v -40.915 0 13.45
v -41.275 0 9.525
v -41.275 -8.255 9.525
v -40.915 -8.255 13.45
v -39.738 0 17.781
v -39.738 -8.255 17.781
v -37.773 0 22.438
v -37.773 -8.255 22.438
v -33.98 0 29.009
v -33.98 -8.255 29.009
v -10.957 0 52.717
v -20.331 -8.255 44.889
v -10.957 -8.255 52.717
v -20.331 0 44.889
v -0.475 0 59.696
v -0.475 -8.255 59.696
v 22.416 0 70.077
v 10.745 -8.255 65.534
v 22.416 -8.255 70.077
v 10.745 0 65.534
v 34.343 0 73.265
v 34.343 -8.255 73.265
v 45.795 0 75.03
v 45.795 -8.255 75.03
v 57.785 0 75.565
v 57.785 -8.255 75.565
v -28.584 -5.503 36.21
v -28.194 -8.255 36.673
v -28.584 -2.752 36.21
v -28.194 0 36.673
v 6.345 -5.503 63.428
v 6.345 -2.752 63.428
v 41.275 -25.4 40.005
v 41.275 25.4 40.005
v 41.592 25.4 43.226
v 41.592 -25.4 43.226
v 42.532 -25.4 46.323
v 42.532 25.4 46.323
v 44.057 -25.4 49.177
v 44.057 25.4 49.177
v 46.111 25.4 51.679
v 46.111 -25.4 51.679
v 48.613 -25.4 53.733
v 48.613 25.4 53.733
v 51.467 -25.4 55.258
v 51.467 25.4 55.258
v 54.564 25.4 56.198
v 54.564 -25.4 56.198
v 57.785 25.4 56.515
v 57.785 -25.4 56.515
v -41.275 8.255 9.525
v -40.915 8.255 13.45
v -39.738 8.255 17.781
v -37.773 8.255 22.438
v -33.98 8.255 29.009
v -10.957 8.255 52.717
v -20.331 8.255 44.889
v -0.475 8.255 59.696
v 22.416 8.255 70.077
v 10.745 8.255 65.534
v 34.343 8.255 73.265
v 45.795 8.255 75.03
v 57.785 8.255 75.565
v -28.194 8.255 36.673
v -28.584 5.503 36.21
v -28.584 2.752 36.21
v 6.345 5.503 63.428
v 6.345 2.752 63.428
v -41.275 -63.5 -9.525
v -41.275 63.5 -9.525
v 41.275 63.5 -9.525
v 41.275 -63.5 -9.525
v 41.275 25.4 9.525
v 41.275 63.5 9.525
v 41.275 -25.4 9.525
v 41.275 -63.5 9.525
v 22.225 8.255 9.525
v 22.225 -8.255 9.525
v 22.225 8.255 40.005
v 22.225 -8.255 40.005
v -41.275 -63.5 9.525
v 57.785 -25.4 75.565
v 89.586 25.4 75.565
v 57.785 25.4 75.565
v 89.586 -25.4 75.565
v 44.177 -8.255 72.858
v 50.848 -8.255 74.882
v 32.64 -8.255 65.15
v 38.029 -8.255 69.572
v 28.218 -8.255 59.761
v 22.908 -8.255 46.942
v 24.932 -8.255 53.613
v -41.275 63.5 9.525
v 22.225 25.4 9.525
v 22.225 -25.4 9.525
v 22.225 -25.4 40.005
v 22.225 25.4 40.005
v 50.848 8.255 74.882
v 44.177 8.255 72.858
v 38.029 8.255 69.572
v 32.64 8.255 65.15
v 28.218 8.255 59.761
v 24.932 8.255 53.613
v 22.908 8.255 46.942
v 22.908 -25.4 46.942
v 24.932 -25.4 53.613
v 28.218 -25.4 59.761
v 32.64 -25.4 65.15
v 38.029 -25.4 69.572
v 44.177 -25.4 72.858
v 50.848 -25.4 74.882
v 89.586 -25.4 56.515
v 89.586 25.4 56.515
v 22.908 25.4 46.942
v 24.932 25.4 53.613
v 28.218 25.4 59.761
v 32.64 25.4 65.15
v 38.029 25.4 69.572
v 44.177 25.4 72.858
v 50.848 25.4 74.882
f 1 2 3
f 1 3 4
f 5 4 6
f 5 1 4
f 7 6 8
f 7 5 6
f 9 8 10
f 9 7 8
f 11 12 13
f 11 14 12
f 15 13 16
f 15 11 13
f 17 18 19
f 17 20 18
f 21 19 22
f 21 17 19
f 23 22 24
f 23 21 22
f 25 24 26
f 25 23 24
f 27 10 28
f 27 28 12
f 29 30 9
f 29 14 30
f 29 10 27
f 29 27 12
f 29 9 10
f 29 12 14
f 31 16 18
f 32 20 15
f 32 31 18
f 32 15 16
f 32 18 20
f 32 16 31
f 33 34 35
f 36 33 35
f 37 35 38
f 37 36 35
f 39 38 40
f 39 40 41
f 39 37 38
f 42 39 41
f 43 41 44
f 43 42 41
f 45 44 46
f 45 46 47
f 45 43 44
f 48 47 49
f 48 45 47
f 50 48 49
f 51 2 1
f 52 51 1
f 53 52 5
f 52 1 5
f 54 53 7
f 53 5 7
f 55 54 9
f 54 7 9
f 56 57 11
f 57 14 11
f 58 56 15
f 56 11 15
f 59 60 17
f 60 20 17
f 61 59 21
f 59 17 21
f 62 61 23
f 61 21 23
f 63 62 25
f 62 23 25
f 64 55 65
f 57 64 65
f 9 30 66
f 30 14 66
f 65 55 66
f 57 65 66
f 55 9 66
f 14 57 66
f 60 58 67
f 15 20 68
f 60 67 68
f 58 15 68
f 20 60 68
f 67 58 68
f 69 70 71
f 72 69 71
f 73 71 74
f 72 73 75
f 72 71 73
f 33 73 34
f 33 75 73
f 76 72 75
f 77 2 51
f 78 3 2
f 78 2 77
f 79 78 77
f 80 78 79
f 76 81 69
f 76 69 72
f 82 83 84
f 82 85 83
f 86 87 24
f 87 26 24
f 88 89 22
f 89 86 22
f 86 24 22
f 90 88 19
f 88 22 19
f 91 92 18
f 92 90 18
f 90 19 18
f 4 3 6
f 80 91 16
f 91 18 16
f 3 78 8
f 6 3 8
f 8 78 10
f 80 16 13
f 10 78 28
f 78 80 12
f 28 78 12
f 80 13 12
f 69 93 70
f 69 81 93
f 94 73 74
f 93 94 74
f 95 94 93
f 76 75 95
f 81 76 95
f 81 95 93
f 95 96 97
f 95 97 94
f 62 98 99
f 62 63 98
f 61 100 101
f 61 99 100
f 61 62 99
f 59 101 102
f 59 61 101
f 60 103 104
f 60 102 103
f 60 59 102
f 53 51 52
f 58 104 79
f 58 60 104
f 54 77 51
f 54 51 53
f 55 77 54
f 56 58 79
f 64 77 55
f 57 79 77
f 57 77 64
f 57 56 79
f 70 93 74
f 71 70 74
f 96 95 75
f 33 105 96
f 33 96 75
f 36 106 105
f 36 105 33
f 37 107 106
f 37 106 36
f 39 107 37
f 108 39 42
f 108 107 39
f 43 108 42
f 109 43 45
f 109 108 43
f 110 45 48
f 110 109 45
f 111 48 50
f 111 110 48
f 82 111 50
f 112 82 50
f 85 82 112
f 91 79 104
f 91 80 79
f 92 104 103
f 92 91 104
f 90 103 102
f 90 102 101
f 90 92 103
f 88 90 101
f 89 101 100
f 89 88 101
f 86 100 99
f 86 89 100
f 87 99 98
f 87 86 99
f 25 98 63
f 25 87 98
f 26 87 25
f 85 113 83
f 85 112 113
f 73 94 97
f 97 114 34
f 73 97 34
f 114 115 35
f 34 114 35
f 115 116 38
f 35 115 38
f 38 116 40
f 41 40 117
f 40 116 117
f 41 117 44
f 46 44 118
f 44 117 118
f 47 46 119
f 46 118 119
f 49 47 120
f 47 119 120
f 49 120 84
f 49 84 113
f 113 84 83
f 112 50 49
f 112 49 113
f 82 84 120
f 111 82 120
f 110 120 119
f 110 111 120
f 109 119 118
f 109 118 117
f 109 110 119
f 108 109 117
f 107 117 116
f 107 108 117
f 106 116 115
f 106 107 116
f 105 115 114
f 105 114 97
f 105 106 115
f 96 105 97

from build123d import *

# Parameters (mm, degrees)
F1_DEPTH = 63.5
F0_W     = 17.792325
F0_H     = 19.05
F2_DEPTH = 25.4
F3_DEPTH = 8.255


with BuildPart() as f1:
    # F0 (on Front) → F1 (new body, symmetric)
    with BuildSketch(Plane.XZ):
        Polygon((22.225, 9.525), (-41.275, 9.525), (-41.275, -9.525), (41.275, -9.525), (41.275, 9.525), align=None)
    extrude(amount=F1_DEPTH, both=True)

    # F0 (on Front) → F2 (join, symmetric)
    with BuildSketch(Plane.XZ):
        with BuildLine():
            Line((22.225, 40.005), (22.225, 9.525))
            Line((22.225, 9.525), (41.275, 9.525))
            Line((41.275, 9.525), (41.275, 40.005))
            ThreePointArc((41.275, 40.005), (46.110667, 51.679333), (57.785, 56.515))
            Line((57.785, 56.515), (71.793439, 56.515))
            Line((71.793439, 56.515), (71.793439, 75.565))
            Line((71.793439, 75.565), (57.785, 75.565))
            ThreePointArc((57.785, 75.565), (32.640283, 65.149717), (22.225, 40.005))
        make_face()
        with Locations((80.689601, 66.04)):
            Rectangle(F0_W, F0_H)
    extrude(amount=F2_DEPTH, both=True)


with BuildPart() as f3:
    # F0 (on Front) → F3 (new body, symmetric)
    with BuildSketch(Plane.XZ):
        with BuildLine():
            add(Edge.make_bspline(
                [(-41.275, 9.525), (-41.613553, 30.738614), (0, 76.172836), (57.785, 75.565)],
                knots=[0, 0, 0, 0, 119.055303, 119.055303, 119.055303, 119.055303], degree=3))
            Line((-41.275, 9.525), (22.225, 9.525))
            Line((22.225, 9.525), (22.225, 40.005))
            ThreePointArc((22.225, 40.005), (32.640283, 65.149717), (57.785, 75.565))
        make_face()
    extrude(amount=F3_DEPTH, both=True)


solid = Compound([f1.part, f3.part])
